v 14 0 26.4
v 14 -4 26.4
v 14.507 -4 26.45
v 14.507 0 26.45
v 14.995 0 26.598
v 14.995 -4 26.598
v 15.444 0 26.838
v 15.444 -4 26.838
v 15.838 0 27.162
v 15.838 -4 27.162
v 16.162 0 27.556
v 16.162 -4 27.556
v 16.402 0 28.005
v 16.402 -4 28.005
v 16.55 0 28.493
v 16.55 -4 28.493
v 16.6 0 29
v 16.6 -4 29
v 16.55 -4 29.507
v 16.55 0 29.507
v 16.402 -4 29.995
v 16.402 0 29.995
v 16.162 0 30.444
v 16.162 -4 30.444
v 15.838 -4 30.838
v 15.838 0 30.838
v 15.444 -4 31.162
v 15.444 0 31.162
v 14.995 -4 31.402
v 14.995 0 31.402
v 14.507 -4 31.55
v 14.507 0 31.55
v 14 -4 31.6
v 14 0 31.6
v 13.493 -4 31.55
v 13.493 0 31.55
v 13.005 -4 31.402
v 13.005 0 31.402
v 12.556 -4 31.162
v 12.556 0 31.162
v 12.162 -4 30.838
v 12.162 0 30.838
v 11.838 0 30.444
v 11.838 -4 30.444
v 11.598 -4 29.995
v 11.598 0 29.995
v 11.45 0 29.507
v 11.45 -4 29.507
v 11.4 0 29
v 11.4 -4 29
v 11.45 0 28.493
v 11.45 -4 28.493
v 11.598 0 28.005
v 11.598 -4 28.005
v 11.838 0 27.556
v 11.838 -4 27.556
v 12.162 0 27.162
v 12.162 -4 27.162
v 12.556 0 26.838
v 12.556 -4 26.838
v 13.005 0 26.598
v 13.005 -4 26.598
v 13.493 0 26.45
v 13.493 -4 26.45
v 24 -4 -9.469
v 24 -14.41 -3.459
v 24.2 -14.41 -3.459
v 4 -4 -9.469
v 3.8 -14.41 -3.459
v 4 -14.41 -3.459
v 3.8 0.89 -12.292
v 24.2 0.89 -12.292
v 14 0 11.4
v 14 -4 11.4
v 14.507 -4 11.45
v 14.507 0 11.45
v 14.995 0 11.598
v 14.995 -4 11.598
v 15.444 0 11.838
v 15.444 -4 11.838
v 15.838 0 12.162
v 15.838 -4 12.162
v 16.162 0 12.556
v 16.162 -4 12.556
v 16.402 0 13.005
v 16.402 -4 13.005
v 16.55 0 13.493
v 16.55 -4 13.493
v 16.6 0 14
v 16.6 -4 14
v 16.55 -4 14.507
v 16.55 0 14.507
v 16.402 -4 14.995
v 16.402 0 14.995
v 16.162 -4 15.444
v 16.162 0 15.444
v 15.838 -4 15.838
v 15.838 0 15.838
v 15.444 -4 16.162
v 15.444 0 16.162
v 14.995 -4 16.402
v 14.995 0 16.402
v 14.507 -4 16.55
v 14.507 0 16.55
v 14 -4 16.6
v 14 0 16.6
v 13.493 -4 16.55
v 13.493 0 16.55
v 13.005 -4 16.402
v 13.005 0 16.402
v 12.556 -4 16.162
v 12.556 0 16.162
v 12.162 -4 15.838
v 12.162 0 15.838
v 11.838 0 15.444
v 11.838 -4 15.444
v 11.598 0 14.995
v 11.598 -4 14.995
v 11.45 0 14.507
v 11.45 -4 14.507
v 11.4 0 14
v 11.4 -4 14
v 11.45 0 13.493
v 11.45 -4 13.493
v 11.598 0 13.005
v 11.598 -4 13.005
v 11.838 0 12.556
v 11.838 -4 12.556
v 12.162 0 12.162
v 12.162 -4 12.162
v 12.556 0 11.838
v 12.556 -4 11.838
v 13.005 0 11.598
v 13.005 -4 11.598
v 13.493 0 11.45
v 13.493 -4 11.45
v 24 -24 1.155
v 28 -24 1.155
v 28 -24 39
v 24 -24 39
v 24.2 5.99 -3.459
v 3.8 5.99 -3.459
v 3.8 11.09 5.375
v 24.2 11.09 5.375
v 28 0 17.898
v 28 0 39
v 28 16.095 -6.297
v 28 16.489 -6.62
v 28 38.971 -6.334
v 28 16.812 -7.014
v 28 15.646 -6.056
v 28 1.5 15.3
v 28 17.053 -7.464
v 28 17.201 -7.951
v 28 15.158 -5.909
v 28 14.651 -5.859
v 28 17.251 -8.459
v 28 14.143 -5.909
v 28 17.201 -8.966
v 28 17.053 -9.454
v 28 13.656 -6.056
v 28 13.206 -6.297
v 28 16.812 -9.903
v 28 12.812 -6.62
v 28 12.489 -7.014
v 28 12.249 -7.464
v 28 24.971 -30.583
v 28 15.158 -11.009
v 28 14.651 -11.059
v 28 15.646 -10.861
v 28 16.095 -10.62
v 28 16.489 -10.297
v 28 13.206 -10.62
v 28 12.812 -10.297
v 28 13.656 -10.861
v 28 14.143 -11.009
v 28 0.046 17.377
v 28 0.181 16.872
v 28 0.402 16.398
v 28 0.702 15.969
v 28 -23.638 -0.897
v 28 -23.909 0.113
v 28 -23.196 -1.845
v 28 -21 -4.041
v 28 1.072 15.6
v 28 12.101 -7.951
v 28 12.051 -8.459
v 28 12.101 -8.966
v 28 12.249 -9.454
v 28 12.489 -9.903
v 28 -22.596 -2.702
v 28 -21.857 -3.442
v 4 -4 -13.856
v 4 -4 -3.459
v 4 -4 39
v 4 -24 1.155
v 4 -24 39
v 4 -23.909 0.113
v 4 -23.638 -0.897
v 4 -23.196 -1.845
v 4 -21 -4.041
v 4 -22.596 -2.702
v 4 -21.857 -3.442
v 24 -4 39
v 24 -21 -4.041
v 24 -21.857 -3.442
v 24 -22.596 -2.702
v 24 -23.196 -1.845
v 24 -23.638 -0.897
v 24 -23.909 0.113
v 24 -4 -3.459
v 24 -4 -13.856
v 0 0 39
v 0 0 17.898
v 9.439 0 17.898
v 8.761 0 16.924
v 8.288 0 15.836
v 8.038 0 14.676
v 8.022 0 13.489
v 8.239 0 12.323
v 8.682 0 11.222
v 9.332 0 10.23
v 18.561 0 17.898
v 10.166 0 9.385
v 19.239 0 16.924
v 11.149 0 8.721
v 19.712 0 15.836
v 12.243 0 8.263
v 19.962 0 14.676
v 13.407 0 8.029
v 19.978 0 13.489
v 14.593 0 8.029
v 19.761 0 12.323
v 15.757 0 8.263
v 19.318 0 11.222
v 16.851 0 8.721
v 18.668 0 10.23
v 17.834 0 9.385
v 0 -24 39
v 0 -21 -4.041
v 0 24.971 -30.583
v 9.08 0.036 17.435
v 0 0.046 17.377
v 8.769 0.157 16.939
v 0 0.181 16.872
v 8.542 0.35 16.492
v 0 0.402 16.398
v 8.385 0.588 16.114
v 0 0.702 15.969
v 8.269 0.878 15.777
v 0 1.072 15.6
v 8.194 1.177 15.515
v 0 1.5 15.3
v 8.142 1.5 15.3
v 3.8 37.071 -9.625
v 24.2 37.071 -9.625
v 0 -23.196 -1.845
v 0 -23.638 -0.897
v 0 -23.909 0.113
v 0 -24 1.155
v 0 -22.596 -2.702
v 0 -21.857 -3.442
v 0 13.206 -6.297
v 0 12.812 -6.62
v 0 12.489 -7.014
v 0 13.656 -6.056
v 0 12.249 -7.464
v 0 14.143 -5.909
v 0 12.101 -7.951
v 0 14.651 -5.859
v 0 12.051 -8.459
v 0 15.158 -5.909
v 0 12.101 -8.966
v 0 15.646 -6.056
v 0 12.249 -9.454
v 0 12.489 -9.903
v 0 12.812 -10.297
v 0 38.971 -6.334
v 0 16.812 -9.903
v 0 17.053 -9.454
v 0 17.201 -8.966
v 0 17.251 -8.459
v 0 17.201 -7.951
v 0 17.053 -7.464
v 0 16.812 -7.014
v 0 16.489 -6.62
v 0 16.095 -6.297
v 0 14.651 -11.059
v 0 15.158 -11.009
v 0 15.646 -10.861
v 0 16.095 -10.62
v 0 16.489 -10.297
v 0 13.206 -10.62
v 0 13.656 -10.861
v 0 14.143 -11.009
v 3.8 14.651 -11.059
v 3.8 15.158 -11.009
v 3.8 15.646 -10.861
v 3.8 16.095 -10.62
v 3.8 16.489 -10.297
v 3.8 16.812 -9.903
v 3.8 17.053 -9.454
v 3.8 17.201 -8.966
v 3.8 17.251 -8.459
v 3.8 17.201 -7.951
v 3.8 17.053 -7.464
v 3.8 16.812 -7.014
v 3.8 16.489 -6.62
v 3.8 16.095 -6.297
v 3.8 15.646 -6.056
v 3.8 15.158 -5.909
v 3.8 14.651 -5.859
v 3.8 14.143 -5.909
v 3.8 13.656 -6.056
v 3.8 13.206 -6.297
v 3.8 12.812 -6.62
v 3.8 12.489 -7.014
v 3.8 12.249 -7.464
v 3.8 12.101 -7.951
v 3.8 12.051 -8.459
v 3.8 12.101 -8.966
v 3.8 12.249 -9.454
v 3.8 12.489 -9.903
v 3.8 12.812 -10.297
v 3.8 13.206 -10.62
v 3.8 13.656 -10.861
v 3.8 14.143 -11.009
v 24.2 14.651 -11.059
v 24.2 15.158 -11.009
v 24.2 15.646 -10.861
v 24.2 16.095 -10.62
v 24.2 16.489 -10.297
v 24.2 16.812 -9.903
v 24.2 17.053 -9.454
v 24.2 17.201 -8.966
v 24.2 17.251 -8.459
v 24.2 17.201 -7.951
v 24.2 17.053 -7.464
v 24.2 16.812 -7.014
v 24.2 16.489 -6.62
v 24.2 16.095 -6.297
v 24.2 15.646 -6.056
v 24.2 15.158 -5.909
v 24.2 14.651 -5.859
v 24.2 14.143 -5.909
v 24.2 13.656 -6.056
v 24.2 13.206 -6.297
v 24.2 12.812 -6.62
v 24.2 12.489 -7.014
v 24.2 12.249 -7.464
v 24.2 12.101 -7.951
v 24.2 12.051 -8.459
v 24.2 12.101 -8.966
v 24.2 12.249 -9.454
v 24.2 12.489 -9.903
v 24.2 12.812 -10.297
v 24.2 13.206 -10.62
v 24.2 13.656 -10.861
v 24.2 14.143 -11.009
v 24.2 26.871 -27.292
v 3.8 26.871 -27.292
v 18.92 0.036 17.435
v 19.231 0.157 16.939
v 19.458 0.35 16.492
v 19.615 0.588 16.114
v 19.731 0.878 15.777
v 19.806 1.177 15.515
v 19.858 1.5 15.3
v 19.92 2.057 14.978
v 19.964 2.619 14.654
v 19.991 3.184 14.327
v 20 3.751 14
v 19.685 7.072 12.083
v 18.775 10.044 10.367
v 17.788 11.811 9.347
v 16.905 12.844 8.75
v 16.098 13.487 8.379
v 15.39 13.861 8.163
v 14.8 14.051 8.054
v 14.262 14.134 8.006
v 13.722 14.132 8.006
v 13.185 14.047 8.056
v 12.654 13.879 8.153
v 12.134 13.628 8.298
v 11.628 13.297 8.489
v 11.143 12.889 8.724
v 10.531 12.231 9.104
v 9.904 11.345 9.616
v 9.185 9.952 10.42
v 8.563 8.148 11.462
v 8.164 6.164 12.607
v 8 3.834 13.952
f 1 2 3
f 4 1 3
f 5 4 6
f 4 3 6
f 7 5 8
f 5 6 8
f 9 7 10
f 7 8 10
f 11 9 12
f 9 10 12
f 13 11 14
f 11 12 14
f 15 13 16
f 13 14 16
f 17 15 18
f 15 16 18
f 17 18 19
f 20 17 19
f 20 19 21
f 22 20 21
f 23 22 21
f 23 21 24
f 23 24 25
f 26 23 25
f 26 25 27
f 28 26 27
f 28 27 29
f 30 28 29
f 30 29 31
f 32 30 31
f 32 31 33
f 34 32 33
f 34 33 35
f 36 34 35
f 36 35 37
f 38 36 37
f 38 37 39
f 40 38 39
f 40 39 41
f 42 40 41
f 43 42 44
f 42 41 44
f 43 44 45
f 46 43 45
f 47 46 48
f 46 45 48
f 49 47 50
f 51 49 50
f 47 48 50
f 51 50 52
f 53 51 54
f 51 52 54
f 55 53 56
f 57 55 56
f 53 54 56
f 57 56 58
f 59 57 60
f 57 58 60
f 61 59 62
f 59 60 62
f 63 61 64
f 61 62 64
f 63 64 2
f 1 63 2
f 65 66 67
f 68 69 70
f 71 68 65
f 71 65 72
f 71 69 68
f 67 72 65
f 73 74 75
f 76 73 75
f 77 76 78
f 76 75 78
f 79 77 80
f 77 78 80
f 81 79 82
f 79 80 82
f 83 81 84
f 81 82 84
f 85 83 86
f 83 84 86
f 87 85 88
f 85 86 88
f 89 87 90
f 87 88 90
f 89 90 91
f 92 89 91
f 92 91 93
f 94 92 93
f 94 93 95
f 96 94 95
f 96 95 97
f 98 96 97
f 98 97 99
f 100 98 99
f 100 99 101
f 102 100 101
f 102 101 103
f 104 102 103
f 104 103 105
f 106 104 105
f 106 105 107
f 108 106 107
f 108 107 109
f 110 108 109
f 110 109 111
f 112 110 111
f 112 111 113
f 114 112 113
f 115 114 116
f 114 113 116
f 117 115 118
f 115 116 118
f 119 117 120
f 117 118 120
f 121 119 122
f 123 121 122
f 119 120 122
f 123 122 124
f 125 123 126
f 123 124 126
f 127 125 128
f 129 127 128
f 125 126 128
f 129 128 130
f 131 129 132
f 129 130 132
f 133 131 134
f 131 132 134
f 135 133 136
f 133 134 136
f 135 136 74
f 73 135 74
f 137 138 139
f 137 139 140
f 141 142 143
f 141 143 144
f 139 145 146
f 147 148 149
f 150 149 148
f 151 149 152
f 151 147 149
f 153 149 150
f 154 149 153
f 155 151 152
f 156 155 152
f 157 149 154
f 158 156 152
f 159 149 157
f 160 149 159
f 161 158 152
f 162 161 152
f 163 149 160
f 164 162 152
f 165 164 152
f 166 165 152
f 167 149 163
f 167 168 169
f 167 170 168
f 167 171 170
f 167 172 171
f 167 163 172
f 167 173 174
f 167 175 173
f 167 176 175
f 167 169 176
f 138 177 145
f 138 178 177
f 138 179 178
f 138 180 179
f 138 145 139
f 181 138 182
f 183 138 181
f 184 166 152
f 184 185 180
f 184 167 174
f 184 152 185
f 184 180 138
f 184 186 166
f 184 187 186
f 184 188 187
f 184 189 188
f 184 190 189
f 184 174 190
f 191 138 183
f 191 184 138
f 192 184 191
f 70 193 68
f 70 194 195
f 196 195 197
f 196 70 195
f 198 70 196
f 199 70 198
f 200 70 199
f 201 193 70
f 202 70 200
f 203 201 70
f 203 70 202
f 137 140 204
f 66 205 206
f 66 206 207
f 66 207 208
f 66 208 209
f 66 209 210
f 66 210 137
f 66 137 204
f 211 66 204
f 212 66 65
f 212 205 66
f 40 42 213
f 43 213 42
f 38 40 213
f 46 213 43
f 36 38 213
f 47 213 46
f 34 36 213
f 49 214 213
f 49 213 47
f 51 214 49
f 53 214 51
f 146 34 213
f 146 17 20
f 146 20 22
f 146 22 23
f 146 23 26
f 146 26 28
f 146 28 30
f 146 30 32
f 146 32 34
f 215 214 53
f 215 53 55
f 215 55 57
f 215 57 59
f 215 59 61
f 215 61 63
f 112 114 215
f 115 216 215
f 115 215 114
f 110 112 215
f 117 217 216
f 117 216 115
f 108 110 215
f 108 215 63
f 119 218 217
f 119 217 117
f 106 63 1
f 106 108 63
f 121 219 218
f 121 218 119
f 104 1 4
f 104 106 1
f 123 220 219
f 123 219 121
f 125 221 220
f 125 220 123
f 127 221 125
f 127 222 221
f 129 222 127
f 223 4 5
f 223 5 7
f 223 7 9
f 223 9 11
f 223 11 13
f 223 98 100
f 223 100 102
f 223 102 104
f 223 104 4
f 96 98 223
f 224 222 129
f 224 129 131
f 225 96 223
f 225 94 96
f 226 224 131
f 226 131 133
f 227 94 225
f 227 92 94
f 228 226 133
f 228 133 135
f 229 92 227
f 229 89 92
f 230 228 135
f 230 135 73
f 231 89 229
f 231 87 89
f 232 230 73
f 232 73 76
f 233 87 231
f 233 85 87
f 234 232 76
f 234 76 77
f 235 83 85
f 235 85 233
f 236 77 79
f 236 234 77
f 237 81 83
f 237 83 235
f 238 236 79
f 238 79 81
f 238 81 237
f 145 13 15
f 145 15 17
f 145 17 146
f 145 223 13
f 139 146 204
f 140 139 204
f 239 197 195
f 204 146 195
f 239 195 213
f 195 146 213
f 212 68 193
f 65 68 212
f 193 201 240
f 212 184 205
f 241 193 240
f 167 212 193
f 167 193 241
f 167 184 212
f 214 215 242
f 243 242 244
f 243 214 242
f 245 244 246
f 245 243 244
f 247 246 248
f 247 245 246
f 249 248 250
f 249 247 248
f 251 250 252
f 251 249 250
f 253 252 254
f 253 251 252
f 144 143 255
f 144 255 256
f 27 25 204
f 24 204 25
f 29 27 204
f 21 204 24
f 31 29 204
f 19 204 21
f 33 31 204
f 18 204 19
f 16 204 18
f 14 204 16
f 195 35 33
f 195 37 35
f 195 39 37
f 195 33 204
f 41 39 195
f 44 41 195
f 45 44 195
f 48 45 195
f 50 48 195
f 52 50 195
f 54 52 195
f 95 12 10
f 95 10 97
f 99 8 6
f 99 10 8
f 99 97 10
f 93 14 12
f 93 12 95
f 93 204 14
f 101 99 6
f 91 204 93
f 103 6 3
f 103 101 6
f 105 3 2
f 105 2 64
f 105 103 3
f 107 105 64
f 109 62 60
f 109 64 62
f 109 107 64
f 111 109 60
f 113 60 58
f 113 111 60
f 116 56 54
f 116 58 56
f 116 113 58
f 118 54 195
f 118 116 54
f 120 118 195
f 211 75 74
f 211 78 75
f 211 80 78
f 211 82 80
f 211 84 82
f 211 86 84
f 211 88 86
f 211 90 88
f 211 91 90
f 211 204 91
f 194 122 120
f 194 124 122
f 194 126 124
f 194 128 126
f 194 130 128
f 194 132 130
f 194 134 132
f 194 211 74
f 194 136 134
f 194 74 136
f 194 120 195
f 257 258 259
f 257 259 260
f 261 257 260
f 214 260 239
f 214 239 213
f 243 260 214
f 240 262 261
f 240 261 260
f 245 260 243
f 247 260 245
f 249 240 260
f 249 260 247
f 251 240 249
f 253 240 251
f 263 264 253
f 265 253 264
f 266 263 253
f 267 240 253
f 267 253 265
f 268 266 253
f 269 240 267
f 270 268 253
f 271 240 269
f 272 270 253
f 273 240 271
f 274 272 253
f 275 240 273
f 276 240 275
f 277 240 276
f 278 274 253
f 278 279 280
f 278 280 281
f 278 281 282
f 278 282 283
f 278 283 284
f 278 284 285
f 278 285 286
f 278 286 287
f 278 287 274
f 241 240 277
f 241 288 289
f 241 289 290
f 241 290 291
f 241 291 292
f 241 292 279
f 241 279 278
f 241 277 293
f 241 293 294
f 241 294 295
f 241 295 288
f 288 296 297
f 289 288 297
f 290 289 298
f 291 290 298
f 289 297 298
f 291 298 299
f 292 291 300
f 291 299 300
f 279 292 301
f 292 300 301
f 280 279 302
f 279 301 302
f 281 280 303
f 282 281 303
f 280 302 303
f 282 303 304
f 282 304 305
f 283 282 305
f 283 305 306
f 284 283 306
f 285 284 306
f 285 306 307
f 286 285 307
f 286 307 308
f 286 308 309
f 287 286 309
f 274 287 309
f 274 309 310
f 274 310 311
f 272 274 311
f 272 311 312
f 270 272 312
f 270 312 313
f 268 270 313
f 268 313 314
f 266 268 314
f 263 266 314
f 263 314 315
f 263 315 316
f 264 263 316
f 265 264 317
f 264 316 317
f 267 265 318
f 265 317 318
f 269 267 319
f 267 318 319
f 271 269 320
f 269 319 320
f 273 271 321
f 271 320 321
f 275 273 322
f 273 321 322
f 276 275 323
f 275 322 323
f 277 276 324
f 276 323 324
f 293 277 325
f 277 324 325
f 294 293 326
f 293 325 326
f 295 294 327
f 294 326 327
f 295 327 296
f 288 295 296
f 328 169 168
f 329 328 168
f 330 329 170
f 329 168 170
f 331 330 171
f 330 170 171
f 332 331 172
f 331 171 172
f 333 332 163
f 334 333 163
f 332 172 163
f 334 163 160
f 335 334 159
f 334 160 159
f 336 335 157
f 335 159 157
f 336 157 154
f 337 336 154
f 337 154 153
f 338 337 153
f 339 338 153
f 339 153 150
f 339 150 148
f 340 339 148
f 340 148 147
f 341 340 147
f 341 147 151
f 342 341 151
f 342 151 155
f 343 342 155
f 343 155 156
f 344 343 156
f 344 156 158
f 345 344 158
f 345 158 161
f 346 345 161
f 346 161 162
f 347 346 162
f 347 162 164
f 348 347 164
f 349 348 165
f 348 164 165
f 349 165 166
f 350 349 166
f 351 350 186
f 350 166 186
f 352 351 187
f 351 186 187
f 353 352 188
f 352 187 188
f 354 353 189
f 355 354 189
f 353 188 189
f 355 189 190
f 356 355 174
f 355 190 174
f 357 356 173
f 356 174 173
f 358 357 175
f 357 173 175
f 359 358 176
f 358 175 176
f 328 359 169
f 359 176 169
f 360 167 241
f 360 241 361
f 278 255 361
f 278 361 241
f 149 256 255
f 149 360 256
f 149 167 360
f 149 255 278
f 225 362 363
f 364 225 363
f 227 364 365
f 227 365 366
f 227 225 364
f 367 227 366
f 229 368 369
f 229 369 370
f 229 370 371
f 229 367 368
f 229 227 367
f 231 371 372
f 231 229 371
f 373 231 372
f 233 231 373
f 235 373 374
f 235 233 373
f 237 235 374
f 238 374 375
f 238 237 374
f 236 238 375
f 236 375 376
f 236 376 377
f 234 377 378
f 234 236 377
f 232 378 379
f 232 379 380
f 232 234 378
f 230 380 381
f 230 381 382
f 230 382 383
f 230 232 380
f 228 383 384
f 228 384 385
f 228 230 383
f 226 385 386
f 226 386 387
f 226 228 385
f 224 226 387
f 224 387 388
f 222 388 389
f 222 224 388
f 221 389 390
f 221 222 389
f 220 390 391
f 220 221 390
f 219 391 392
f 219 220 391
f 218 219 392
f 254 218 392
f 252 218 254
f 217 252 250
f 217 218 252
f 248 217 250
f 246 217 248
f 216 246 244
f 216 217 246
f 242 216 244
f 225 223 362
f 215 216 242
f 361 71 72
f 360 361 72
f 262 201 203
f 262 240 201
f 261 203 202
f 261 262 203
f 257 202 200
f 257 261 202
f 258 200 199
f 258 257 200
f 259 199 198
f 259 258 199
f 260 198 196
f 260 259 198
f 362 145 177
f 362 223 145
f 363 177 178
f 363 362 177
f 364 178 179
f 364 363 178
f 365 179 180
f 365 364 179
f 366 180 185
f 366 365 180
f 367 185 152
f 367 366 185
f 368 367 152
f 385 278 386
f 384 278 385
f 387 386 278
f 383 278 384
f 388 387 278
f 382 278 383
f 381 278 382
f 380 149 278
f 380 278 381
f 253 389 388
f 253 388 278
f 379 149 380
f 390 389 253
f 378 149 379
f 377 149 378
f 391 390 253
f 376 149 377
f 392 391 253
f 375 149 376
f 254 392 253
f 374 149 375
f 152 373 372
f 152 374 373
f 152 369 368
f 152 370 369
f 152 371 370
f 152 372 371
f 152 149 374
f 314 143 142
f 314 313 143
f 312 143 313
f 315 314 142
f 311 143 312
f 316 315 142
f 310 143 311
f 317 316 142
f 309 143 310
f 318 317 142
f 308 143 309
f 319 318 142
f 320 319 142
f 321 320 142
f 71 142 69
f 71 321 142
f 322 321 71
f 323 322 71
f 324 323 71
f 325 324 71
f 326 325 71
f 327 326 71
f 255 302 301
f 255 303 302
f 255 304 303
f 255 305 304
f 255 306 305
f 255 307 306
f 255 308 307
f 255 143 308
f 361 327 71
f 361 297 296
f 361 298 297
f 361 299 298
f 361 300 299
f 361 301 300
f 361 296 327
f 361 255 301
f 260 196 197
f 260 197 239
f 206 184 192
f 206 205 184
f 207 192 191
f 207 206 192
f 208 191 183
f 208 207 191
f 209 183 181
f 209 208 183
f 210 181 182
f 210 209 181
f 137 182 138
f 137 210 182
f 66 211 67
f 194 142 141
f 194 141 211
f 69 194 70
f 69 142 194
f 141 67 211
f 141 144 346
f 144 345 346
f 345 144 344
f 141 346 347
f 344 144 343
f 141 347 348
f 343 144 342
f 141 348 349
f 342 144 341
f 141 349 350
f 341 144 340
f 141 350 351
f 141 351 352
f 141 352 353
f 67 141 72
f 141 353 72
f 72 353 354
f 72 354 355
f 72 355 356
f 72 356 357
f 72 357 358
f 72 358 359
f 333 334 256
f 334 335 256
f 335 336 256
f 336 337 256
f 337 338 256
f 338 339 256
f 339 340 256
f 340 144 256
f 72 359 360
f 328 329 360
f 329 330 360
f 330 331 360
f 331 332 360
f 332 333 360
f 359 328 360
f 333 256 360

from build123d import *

# Parameters (mm, degrees)
BOSS_EXTRUDE1_DEPTH = 28
BOSS_EXTRUDE2_DEPTH = 28
SKETCH5_W           = 20.4
SKETCH5_H           = 20.4
CUT_EXTRUDE3_DEPTH  = 30
CUT_EXTRUDE4_DEPTH  = 20.4
SKETCH7_R           = 2.6
CUT_EXTRUDE5_DEPTH  = 57.903989341
SKETCH8_W           = 20
SKETCH8_H           = 20
CUT_EXTRUDE6_DEPTH  = 60.150040009
SKETCH9_W           = 4
SKETCH9_H           = 20
BOSS_EXTRUDE3_DEPTH = 20
BOSS_EXTRUDE4_DEPTH = 15
SKETCH11_R          = 2.6
CUT_EXTRUDE7_DEPTH  = 65.43228341
SKETCH12_R          = 6
CUT_EXTRUDE8_DEPTH  = 62.836477907
FILLET1_R           = 3
FILLET2_R           = 6


with BuildPart() as part:
    # Sketch1 → Boss-Extrude1 (new body)
    with BuildSketch(Plane(origin=(0, 0, 0), x_dir=(0, 0, -1), z_dir=(1, 0, 0))):
        Polygon((0, 0), (-24, 0), (-24, -4), (-4, -4), (-4, -24), (0, -24), align=None)
    extrude(amount=BOSS_EXTRUDE1_DEPTH)

    # Sketch2 → Boss-Extrude2 (add)
    with BuildSketch(Plane(origin=(28, 0, 0), x_dir=(0, 0, -1), z_dir=(1, 0, 0))):
        Polygon((2.309401077, -24), (30.582903769, 24.97114317), (6.334192463, 38.97114317), (-16.165807537, 0), (0, 0), (0, -24), align=None)
    extrude(amount=-BOSS_EXTRUDE2_DEPTH)

    # Sketch5 → Cut-Extrude3 (cut)
    with BuildSketch(Plane(origin=(0, 31.97114317, -18.458548116), x_dir=(1, 0, 0), z_dir=(0, 0.8660254037844402, -0.4999999999999977))):
        with Locations((14, 0)):
            Rectangle(SKETCH5_W, SKETCH5_H)
    extrude(amount=-CUT_EXTRUDE3_DEPTH, mode=Mode.SUBTRACT)

    # Sketch6 → Cut-Extrude4 (cut)
    with BuildSketch(Plane(origin=(3.8, 0, 0), x_dir=(0, 0, -1), z_dir=(1, 0, 0))):
        Polygon((12.292007234, 0.890381057), (3.458548116, 5.990381057), (3.458548116, -14.409618943), align=None)
    extrude(amount=CUT_EXTRUDE4_DEPTH, mode=Mode.SUBTRACT)

    # Sketch7 → Cut-Extrude5 (cut, through all)
    with BuildSketch(Plane(origin=(28, 0, 0), x_dir=(0, 0, -1), z_dir=(1, 0, 0))):
        with Locations((8.458548116, 14.650635095)):
            Circle(SKETCH7_R)
    extrude(amount=-CUT_EXTRUDE5_DEPTH, mode=Mode.SUBTRACT)

    # Sketch8 → Cut-Extrude6 (cut, through all)
    with BuildSketch(Plane.XY.offset(4)):
        with Locations((14, -14)):
            Rectangle(SKETCH8_W, SKETCH8_H)
    extrude(amount=-CUT_EXTRUDE6_DEPTH, mode=Mode.SUBTRACT)

    # Sketch9 → Boss-Extrude3 (add)
    with BuildSketch(Plane.XY.offset(4)):
        with Locations((2, -14)):
            Rectangle(SKETCH9_W, SKETCH9_H)
        with Locations((26, -14)):
            Rectangle(SKETCH9_W, SKETCH9_H)
    extrude(amount=BOSS_EXTRUDE3_DEPTH)

    # Sketch10 → Boss-Extrude4 (add)
    with BuildSketch(Plane.XY.offset(24)):
        Polygon((0, 0), (28, 0), (28, -24), (24, -24), (24, -4), (4, -4), (4, -24), (0, -24), align=None)
    extrude(amount=BOSS_EXTRUDE4_DEPTH)

    # Sketch11 → Cut-Extrude7 (cut, through all)
    with BuildSketch(Plane.XZ.offset(4)):
        with Locations(Location((14, 29, 0), (0, 0, 270))):
            Circle(SKETCH11_R)
        with Locations(Location((14, 14, 0), (0, 0, 270))):
            Circle(SKETCH11_R)
    extrude(amount=-CUT_EXTRUDE7_DEPTH, mode=Mode.SUBTRACT)

    # Sketch12 → Cut-Extrude8 (cut, through all)
    with BuildSketch(Plane(origin=(0, 0, 0), x_dir=(1, 0, 0), z_dir=(0, 1, 0))):
        with Locations((14, -14)):
            Circle(SKETCH12_R)
    extrude(amount=CUT_EXTRUDE8_DEPTH, mode=Mode.SUBTRACT)

    # Fillet1
    fillet1_edges = [part.edges().sort_by_distance(p)[0] for p in [
        (23.797734696, 0, 16.165807537),
        (4.202265304, 0, 16.165807537),
    ]]
    fillet(fillet1_edges, radius=FILLET1_R)

    # Fillet2
    fillet2_edges = [part.edges().sort_by_distance(p)[0] for p in [
        (2, -24, -2.309401077),
        (26, -24, -2.309401077),
    ]]
    fillet(fillet2_edges, radius=FILLET2_R)


solid = part.part
